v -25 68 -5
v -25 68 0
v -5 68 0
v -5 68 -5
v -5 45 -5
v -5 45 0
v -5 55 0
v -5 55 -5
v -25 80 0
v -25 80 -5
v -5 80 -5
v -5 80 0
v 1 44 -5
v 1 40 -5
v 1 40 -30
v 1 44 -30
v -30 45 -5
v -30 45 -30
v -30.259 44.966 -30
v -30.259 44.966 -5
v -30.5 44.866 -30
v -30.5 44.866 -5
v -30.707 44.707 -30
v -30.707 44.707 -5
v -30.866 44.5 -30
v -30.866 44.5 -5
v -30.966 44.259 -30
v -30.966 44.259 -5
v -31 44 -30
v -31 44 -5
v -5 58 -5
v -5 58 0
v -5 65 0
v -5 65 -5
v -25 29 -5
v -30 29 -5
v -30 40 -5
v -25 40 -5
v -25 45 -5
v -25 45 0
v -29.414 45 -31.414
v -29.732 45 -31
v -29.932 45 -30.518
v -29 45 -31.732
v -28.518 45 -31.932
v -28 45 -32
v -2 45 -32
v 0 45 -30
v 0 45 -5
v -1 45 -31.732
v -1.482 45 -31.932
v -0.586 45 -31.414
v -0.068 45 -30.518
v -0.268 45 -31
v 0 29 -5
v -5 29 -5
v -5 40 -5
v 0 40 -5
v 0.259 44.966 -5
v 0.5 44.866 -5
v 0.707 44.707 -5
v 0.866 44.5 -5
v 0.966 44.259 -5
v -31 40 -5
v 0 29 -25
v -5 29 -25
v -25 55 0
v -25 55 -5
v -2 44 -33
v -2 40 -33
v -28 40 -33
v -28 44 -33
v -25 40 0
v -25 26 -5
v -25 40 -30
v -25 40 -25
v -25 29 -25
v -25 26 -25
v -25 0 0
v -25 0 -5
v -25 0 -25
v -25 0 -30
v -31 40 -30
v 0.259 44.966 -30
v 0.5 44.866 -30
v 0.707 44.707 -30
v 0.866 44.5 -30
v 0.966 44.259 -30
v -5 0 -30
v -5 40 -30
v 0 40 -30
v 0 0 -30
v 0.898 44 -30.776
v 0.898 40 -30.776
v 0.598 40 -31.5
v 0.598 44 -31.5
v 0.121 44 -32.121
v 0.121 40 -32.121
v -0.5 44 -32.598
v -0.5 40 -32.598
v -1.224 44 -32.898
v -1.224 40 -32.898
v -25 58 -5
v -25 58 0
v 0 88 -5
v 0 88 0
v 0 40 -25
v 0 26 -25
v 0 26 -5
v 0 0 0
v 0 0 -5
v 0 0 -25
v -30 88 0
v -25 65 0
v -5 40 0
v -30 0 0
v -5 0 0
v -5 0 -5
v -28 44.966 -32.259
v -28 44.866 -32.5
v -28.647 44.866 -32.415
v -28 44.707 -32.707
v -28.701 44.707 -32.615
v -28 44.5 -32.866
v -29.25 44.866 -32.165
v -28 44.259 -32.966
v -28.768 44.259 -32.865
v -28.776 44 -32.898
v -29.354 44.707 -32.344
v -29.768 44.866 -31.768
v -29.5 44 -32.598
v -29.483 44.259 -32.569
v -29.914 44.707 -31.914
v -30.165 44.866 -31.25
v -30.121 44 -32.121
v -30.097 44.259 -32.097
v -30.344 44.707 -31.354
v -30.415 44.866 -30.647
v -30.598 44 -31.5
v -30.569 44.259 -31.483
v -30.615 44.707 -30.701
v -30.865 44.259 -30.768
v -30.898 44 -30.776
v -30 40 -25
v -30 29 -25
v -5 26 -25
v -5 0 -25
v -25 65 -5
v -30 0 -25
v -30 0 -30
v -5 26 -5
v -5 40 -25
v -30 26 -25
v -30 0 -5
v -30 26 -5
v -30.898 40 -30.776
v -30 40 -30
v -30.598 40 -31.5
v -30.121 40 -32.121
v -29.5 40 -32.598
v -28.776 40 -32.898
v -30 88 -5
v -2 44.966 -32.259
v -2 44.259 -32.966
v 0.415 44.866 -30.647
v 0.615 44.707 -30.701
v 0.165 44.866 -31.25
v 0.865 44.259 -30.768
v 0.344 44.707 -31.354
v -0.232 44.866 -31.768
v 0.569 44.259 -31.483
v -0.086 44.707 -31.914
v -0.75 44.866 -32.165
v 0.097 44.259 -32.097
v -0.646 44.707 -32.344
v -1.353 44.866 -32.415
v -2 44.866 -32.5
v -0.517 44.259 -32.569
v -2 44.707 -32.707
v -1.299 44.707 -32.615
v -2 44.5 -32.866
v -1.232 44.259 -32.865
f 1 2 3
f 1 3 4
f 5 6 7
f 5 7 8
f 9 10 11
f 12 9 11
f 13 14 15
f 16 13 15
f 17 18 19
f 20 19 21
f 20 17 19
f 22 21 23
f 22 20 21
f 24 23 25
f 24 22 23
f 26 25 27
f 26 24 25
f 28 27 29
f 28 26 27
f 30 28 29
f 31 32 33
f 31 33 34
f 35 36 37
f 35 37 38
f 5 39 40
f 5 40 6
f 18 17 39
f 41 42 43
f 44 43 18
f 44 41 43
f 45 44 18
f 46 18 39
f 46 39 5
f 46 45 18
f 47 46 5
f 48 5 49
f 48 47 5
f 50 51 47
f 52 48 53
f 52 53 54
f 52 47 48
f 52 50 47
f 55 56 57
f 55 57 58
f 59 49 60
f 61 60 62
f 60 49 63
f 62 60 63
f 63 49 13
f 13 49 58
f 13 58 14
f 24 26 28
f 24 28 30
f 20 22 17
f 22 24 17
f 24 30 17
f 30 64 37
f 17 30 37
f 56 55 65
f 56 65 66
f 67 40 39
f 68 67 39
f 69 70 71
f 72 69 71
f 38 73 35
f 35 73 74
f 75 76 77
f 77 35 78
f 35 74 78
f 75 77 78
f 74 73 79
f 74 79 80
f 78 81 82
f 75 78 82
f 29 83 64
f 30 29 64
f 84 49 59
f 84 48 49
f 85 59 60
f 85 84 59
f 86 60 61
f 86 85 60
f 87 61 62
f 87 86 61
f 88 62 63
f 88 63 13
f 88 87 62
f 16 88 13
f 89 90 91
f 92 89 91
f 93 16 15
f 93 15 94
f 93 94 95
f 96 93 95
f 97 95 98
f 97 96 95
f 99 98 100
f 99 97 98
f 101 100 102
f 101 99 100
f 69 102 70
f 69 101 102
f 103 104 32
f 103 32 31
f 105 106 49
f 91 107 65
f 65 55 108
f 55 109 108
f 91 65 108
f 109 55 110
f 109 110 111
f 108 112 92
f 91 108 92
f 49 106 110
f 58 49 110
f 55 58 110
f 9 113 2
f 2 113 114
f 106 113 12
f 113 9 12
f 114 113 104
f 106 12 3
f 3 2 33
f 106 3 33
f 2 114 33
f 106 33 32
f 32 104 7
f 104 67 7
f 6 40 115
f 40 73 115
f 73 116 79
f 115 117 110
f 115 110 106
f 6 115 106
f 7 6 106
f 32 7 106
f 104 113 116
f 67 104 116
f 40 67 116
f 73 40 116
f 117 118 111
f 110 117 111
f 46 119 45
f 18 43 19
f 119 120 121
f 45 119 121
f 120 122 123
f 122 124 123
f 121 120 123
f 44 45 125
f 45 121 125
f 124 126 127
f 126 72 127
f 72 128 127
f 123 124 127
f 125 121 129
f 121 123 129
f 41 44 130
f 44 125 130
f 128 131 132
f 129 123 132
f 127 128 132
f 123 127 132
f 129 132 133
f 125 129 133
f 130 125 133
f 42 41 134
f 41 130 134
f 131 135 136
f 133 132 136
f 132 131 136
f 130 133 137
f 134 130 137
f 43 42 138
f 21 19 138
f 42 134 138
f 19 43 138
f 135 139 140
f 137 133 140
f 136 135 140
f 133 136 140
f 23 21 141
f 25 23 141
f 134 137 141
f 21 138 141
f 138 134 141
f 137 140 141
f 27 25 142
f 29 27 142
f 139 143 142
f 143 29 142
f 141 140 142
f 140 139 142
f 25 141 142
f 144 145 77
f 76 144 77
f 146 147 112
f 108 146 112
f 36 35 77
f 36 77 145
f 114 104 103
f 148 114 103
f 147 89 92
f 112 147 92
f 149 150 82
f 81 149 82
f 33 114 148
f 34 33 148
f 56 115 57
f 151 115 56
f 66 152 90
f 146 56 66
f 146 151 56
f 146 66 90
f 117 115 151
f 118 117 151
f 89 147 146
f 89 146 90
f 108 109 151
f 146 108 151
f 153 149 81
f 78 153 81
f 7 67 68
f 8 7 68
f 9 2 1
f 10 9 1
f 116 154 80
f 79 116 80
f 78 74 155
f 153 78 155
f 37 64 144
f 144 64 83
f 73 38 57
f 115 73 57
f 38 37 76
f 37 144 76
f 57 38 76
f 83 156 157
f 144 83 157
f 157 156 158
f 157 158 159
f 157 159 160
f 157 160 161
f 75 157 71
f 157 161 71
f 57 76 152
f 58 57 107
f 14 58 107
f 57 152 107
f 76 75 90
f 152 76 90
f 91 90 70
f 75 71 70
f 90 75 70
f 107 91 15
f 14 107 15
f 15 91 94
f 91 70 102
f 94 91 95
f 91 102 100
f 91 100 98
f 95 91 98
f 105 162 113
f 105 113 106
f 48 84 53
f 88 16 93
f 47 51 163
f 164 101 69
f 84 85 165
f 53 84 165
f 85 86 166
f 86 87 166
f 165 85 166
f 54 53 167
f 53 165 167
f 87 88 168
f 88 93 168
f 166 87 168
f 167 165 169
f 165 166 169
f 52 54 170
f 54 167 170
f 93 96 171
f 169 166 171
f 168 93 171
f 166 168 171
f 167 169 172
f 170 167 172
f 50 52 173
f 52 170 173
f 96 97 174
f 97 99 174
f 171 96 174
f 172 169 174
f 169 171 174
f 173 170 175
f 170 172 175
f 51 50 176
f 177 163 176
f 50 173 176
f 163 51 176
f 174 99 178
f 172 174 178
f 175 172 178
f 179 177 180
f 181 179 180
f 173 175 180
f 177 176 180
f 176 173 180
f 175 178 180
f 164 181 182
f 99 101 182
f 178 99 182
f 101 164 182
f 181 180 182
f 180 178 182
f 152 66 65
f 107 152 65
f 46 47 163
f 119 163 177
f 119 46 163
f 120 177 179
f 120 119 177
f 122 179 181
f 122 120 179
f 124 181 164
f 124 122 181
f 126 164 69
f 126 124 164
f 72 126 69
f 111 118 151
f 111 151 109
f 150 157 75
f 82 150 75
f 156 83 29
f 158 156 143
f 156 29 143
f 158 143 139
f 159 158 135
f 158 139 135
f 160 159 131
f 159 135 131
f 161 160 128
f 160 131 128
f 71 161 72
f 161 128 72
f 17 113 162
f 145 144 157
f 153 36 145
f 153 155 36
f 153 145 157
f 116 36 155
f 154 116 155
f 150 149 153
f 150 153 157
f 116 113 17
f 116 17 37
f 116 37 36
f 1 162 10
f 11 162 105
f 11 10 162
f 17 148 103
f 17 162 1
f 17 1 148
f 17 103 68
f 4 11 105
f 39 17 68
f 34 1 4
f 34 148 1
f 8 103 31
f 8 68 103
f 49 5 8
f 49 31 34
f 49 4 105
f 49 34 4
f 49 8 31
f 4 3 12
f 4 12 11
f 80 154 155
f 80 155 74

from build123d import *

# Parameters (mm, degrees)
SKETCH1_W             = 5
SKETCH1_H             = 5
BOSS_EXTRUDE1_DEPTH   = 40
BOSS_EXTRUDE1_2_DEPTH = 40
BOSS_EXTRUDE1_3_DEPTH = 40
BOSS_EXTRUDE1_4_DEPTH = 40
BOSS_EXTRUDE2_DEPTH   = 5
SKETCH3_W             = 5
SKETCH3_H             = 5
BOSS_EXTRUDE3_DEPTH   = 40
SKETCH4_W             = 30
SKETCH4_H             = 5
BOSS_EXTRUDE4_DEPTH   = 8
SKETCH5_W             = 5
SKETCH5_H             = 3
BOSS_EXTRUDE5_DEPTH   = 20
SKETCH6_W             = 5
SKETCH6_H             = 3
BOSS_EXTRUDE6_DEPTH   = 20
FILLET1_R             = 3
FILLET2_R             = 1


with BuildPart() as part:
    # Sketch1 → Boss-Extrude1 (new body)
    with BuildSketch(Plane(origin=(0, 0, 0), x_dir=(1, 0, 0), z_dir=(0, 1, 0))):
        with Locations((-27.5, 2.5)):
            Rectangle(SKETCH1_W, SKETCH1_H)
    extrude(amount=BOSS_EXTRUDE1_DEPTH)



with BuildPart() as body_2:
    # Sketch1 → Boss-Extrude1 2 (new body)
    with BuildSketch(Plane(origin=(0, 0, 0), x_dir=(1, 0, 0), z_dir=(0, 1, 0))):
        with Locations((-2.5, 2.5)):
            Rectangle(SKETCH1_W, SKETCH1_H)
    extrude(amount=BOSS_EXTRUDE1_2_DEPTH)


with BuildPart() as body_3:
    # Sketch1 → Boss-Extrude1 3 (new body)
    with BuildSketch(Plane(origin=(0, 0, 0), x_dir=(1, 0, 0), z_dir=(0, 1, 0))):
        with Locations((-2.5, 27.5)):
            Rectangle(SKETCH1_W, SKETCH1_H)
    extrude(amount=BOSS_EXTRUDE1_3_DEPTH)



with BuildPart() as body_4:
    # Sketch1 → Boss-Extrude1 4 (new body)
    with BuildSketch(Plane(origin=(0, 0, 0), x_dir=(1, 0, 0), z_dir=(0, 1, 0))):
        with Locations((-27.5, 27.5)):
            Rectangle(SKETCH1_W, SKETCH1_H)
    extrude(amount=BOSS_EXTRUDE1_4_DEPTH)


with BuildPart() as body_3_1:
    add(body_3.part)

    add(body_4.part)  # Boss-Extrude2 merges body 4
    # Sketch2 → Boss-Extrude2 (add)
    with BuildSketch(Plane(origin=(0, 40, 0), x_dir=(1, 0, 0), z_dir=(0, 1, 0))):
        Polygon((-5, 0), (-5, 5), (1, 5), (1, 33), (-31, 33), (-31, 5), (-30, 5), (-25, 5), (-25, 0), align=None)
    extrude(amount=BOSS_EXTRUDE2_DEPTH)


with BuildPart() as part_1:
    add(part.part)

    add(body_2.part)  # Boss-Extrude3 merges body 2

    add(body_3_1.part)  # Boss-Extrude3 merges body 3
    # Sketch3 → Boss-Extrude3 (add)
    with BuildSketch(Plane(origin=(0, 40, 0), x_dir=(1, 0, 0), z_dir=(0, 1, 0))):
        with Locations((-27.5, 2.5)):
            Rectangle(SKETCH3_W, SKETCH3_H)
        with Locations((-2.5, 2.5)):
            Rectangle(SKETCH3_W, SKETCH3_H)
    extrude(amount=BOSS_EXTRUDE3_DEPTH)

    # Sketch4 → Boss-Extrude4 (add)
    with BuildSketch(Plane(origin=(0, 80, 0), x_dir=(1, 0, 0), z_dir=(0, 1, 0))):
        with Locations((-15, 2.5)):
            Rectangle(SKETCH4_W, SKETCH4_H)
    extrude(amount=BOSS_EXTRUDE4_DEPTH)

    # Sketch5 → Boss-Extrude5 (add)
    with BuildSketch(Plane(origin=(-25, 0, 0), x_dir=(0, 0, -1), z_dir=(1, 0, 0))):
        with Locations((2.5, 66.5)):
            Rectangle(SKETCH5_W, SKETCH5_H)
        with Locations((2.5, 56.5)):
            Rectangle(SKETCH5_W, SKETCH5_H)
    extrude(amount=BOSS_EXTRUDE5_DEPTH)

    # Sketch6 → Boss-Extrude6 (add)
    with BuildSketch(Plane(origin=(0, 0, -5), x_dir=(-1, 0, 0), z_dir=(0, 0, -1))):
        with Locations((2.5, 27.5)):
            Rectangle(SKETCH6_W, SKETCH6_H)
        with Locations((27.5, 27.5)):
            Rectangle(SKETCH6_W, SKETCH6_H)
    extrude(amount=BOSS_EXTRUDE6_DEPTH)

    # Fillet1
    fillet1_edges = [part_1.edges().sort_by_distance(p)[0] for p in [
        (1, 42.5, -33),
        (-31, 42.5, -33),
    ]]
    fillet(fillet1_edges, radius=FILLET1_R)

    # Fillet2
    fillet2_edges = [part_1.edges().sort_by_distance(p)[0] for p in [
        (-31, 45, -17.5),
        (-30.121320344, 45, -32.121320344),
        (-15, 45, -33),
        (0.121320344, 45, -32.121320344),
        (1, 45, -17.5),
    ]]
    fillet(fillet2_edges, radius=FILLET2_R)


solid = part_1.part
